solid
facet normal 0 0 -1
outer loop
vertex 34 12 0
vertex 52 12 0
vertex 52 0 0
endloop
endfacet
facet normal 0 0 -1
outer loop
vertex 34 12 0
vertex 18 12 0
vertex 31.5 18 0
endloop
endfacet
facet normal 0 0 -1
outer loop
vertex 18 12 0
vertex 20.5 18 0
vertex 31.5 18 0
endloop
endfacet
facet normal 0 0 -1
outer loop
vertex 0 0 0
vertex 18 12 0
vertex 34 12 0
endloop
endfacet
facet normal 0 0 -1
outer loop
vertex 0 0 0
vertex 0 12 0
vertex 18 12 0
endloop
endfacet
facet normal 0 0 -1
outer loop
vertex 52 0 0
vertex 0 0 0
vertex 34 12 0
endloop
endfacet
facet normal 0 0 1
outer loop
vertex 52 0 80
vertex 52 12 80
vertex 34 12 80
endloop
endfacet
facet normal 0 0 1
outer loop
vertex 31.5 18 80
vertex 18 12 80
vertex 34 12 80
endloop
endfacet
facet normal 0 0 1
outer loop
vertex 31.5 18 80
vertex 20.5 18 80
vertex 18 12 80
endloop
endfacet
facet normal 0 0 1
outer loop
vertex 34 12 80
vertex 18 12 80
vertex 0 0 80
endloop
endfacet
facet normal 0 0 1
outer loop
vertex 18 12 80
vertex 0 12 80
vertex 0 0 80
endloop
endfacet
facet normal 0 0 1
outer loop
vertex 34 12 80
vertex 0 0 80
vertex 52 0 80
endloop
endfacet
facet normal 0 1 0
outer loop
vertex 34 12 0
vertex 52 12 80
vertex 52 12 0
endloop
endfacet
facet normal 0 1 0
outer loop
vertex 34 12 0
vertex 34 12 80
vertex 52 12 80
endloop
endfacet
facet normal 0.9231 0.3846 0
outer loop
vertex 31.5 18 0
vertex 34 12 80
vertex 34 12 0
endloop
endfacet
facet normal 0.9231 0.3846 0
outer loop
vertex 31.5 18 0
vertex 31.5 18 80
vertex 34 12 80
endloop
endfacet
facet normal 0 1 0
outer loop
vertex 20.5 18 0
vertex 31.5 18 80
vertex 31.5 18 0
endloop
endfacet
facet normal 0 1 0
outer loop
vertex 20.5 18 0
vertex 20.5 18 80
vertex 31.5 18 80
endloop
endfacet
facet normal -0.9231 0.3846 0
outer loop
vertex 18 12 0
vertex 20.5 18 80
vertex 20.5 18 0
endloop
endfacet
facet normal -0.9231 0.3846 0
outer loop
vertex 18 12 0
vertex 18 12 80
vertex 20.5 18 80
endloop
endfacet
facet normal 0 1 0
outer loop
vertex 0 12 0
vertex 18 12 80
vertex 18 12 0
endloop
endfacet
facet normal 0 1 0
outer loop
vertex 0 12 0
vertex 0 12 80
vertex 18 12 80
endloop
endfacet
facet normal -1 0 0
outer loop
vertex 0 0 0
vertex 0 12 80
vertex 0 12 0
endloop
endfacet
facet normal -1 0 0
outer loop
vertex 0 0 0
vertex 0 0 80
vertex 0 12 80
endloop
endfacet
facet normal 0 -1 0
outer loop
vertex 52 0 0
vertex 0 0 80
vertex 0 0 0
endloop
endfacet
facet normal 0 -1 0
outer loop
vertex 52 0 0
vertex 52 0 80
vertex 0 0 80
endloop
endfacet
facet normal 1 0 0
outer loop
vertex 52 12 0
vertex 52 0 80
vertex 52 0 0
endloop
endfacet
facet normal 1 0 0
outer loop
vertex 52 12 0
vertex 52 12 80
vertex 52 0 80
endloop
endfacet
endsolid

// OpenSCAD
$fn = 32;

// ----------------------------------------------------------------------
// V guide rail: dovetail, 52 mm wide
// ----------------------------------------------------------------------

// --- parameters (mm) ---
rail_w = 52;              // rail width, X
base_t = 12;              // base plate thickness
v_depth = 6;              // V feature depth / height
v_half_w = 8;             // half width of the V at the base face
plate_t = 80;             // rail length, Z (the extrusion height)
top_half_w = 5.5;         // half width at the dovetail top
fit_tol = 0.1;            // declared fit tolerance (prompt contract)
free_tol = 0.5;           // declared free tolerance (prompt contract)

dovetail_base = 2 * v_half_w;  // dovetail width at the base
dovetail_top = 2 * top_half_w;  // dovetail width at the top

profile = [[0, 0], [52, 0], [52, 12], [34, 12], [31.5, 18], [20.5, 18], [18, 12], [0, 12]];  // primary outline, 8 points, counter clockwise

// --- the one profile operation ---
linear_extrude(height = plate_t) polygon(points = profile);
